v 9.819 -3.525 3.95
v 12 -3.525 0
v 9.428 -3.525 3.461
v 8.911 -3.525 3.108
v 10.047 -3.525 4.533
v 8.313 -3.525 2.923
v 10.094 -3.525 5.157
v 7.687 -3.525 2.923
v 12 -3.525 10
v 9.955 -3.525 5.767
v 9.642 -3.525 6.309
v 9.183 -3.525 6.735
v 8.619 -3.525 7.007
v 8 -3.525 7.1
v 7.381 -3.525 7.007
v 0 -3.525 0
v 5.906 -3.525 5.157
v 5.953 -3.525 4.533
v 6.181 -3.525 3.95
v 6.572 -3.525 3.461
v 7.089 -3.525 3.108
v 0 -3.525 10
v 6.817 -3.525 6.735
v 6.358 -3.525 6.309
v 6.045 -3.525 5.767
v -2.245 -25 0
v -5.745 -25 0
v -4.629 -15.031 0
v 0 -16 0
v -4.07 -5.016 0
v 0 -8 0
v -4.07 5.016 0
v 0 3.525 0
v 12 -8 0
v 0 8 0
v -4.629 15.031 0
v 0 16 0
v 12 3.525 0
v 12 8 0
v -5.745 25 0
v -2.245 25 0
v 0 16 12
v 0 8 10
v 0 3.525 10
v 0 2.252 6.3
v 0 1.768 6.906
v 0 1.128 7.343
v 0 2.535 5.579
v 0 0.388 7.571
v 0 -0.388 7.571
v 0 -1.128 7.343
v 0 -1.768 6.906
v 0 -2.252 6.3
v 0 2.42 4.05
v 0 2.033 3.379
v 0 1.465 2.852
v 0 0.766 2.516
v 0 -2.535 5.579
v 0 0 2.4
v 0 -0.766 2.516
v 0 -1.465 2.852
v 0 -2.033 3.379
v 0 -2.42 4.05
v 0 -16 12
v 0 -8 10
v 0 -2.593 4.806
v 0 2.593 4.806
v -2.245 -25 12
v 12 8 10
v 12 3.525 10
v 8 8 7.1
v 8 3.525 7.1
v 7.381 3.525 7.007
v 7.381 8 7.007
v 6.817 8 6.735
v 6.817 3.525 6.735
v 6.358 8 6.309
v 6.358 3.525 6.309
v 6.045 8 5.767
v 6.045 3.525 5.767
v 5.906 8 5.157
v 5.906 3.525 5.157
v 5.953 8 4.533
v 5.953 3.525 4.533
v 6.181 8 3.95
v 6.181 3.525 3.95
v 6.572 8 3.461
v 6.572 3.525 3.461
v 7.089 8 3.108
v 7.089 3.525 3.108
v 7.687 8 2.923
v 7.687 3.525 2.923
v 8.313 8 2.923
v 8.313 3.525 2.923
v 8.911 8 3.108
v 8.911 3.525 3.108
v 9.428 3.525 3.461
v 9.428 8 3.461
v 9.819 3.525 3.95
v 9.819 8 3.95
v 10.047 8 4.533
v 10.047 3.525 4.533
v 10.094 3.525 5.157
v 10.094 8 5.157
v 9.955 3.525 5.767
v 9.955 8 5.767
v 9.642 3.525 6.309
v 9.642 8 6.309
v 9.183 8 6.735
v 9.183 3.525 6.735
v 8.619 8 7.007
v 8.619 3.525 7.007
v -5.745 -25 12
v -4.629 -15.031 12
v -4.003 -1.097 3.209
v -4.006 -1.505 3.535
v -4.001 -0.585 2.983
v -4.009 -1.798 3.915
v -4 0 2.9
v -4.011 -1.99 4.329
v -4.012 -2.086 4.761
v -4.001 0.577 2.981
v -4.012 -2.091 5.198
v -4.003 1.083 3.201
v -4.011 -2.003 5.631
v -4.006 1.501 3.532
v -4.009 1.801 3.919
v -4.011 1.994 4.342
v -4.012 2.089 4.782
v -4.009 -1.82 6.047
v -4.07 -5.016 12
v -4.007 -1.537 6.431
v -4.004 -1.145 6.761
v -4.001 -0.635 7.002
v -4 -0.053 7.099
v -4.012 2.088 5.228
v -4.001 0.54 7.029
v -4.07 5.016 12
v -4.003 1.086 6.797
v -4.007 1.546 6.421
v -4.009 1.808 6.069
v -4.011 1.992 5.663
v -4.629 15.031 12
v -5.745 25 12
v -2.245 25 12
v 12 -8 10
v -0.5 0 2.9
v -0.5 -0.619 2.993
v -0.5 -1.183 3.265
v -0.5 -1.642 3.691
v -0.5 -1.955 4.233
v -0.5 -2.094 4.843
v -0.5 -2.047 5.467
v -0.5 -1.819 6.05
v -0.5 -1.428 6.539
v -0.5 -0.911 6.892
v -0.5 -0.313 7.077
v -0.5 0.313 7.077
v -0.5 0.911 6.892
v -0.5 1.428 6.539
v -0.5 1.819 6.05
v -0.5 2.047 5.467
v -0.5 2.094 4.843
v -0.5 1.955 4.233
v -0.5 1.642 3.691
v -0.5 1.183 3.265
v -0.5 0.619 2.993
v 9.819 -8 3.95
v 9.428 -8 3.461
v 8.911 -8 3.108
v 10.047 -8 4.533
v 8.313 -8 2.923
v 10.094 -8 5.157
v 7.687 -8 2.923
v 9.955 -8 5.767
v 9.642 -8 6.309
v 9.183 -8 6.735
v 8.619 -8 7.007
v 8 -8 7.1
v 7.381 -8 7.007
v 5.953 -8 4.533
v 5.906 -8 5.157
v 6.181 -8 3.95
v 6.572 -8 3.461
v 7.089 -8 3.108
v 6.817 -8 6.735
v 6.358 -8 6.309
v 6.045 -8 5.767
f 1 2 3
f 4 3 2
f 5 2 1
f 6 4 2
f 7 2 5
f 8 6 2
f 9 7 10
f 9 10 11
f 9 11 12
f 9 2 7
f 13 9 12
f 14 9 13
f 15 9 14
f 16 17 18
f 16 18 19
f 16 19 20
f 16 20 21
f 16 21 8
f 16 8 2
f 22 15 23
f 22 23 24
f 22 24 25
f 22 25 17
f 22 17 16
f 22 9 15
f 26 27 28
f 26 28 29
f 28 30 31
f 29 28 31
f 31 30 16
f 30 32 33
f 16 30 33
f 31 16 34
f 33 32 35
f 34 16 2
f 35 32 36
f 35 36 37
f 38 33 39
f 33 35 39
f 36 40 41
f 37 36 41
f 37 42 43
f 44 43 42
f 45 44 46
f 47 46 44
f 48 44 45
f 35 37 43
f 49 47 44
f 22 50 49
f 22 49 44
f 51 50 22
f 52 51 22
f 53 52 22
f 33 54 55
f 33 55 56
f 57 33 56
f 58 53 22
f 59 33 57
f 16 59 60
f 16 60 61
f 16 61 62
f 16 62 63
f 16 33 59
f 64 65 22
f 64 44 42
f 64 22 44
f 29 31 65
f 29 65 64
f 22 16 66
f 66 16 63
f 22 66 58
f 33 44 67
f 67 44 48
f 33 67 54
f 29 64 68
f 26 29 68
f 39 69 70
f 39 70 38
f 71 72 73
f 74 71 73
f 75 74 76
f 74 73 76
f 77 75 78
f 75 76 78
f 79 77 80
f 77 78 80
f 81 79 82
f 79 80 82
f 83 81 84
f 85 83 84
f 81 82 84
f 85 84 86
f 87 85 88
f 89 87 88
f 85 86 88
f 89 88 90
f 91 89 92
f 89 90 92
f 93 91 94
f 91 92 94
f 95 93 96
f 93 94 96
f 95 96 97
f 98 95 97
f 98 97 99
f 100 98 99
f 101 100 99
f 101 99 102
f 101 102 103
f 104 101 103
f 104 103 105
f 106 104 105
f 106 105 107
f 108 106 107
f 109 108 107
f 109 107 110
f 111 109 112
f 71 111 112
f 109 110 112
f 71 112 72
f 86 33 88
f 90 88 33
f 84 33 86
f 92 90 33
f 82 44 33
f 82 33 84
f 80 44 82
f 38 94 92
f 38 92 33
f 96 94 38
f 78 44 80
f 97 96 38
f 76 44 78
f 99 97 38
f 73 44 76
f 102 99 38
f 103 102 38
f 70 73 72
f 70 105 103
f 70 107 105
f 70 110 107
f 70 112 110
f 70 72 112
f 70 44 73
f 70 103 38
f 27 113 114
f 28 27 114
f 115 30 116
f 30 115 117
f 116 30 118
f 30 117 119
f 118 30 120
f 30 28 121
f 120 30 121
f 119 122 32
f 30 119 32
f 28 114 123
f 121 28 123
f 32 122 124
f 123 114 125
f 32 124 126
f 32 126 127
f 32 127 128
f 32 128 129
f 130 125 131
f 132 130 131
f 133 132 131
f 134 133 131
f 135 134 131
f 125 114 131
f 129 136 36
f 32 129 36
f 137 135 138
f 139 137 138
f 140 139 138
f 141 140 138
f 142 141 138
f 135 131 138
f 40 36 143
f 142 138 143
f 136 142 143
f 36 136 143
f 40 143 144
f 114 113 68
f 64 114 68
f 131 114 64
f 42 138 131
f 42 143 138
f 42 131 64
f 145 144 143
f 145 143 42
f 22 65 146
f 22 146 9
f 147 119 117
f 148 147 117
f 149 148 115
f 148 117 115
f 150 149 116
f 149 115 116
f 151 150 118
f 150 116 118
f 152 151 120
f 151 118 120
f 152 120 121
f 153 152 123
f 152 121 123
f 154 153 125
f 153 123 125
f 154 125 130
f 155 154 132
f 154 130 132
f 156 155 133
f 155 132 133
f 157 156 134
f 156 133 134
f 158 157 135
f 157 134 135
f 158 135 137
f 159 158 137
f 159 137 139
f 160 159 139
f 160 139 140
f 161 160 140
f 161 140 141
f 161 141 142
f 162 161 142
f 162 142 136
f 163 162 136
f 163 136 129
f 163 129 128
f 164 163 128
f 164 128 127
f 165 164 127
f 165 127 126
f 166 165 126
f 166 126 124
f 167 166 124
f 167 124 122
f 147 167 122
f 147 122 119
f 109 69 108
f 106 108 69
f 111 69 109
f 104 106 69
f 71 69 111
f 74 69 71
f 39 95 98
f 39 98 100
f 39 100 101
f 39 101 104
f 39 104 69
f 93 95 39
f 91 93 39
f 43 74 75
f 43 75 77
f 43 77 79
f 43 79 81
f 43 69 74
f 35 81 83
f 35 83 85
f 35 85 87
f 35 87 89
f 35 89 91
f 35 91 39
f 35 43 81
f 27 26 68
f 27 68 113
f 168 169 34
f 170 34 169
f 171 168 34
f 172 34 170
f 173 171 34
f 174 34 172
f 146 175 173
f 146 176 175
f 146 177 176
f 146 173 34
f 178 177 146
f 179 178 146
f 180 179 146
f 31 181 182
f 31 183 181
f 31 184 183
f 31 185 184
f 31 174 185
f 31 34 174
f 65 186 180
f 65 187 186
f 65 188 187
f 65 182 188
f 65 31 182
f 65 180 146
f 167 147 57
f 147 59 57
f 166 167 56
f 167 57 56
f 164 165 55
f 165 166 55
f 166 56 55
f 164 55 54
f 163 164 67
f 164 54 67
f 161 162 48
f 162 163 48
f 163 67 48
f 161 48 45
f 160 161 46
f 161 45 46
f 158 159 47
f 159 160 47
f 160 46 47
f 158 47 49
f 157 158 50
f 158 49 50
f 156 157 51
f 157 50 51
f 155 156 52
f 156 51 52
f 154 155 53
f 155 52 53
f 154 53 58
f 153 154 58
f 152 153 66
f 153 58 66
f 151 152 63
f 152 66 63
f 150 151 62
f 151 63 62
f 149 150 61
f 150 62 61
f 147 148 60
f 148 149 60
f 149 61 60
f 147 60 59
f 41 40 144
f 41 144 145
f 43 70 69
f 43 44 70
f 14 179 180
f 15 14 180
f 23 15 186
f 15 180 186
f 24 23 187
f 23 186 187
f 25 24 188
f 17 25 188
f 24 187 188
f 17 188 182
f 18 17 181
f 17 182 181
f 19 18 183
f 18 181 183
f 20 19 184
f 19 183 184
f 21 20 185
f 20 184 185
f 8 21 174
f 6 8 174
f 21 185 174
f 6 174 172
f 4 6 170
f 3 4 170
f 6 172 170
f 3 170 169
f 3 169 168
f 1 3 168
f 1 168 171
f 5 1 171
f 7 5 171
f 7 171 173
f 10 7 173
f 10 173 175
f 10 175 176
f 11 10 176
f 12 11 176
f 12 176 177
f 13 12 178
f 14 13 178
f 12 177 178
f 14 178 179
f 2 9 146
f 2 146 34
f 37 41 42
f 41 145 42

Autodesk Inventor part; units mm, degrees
ref_plane "YZ Plane" through (0, 0, 0) normal (1, 0, 0) x (0, 1, 0)
ref_plane "XZ Plane" through (0, 0, 0) normal (0, 1, 0) x (-1, 0, 0)
ref_plane "XY Plane" through (0, 0, 0) normal (0, 0, 1) x (1, 0, 0)
sketch "Skizze1" plane through (0, 0, 0) normal (0, 0, 1) x (1, 0, 0)
  line L0 (-7, 25) -> (0, 25)
  line L1 (0, 25) -> (0, -25)
  line L2 (0, -25) -> (-7, -25)
  line L3 (-7, -25) -> (-7, 25)
  point P0 (0, 0)
  point P1 (0, 0)
  dimension "d0" = 7
  dimension "d1" = 50
extrude "Extrusion1" add sketch "Skizze1" along normal blind 12
sketch "Skizze2" plane through (0, -25, 0) normal (1, 0, 0) x (0, 0, -1)
  line L0 (-10, 33) -> (0, 33)
  line L1 (0, 33) -> (0, 17)
  line L2 (0, 17) -> (-10, 17)
  line L3 (-10, 17) -> (-10, 33)
  line L4 (0, 0) -> (0, 50) projected
  line L5 (-12, 0) -> (-12, 50) projected
  point P0 (0, 25)
  point P1 (0, 25)
  point P2 (0, 25)
  dimension "d4" = 0
  dimension "d6" = 16
  dimension "d48" = 10
extrude "Extrusion2" add sketch "Skizze2" along normal blind 12
sketch "Skizze5" plane through (0, 0, 12) normal (0, 0, 1) x (1, 0, 0)
  line L0 (12, -3.525) -> (0, -3.525)
  line L1 (0, -3.525) -> (0, 3.525)
  line L2 (0, 3.525) -> (12, 3.525)
  line L3 (12, 3.525) -> (12, -3.525)
  line L4 (12, -3.525) -> (0, 3.525) construction
  line L5 (0, -3.525) -> (12, 3.525) construction
  line L6 (12, 8) -> (12, -8) projected
  point P0 (0, 0)
  point P1 (6, 0)
  point P2 (6, 0)
  point P3 (0, 0)
  point P4 (6, 0)
  dimension "d27" = 7.05
extrude "Extrusion3" cut sketch "Skizze5" against normal through all
sketch "Skizze6" plane through (0, 8, 12) normal (0, 1, 0) x (1, 0, 0)
  line L0 (0, 2) -> (0, 12) construction
  line L1 (0, 2) -> (12, 2) construction
  line L2 (12, 12) -> (12, 2) construction
  line L3 (0, 12) -> (12, 12) construction
  point P0 (0, 12)
  point P1 (8, 7)
  point P2 (12, 7)
  point P3 (6, 2)
  dimension "d38" = 8
  dimension "d47" = 5
hole "Bohrung3" at (8, 8, 5) direction (0, -1, 0) diameter 4.2 end through all
sketch "Skizze7" plane through (0, -3.525, 12) normal (1, 0, 0) x (0, 0, -1)
  line L0 (12, 7.05) -> (12, 0) construction
  line L1 (2, 7.05) -> (12, 7.05) construction
  line L2 (0, -21.475) -> (0, 28.525) construction
  line L3 (2, 0) -> (12, 0) construction
  line L4 (12, 0) -> (2, 0) projected
  line L5 (12, -21.475) -> (0, -21.475) projected
  line L6 (12, -21.475) -> (12, -4.475) projected
  line L7 (12, -4.475) -> (2, -4.475) projected
  line L8 (2, -4.475) -> (2, 0) projected
  line L9 (2, 7.05) -> (2, 11.525) projected
  line L10 (2, 11.525) -> (12, 11.525) projected
  line L11 (12, 11.525) -> (12, 28.525) projected
  line L12 (12, 28.525) -> (0, 28.525) projected
  line L13 (2, 7.05) -> (12, 7.05) projected
  point P0 (12, 3.525)
  point P1 (0, 0)
  point P2 (7, 3.525)
  point P3 (7, 0)
  point P4 (0, 3.525)
  point P5 (7, 7.05)
hole "Bohrung4" at (0, 0, 5) direction (-1, 0, 0) diameter 4.2 end through all
sketch "Skizze9" plane through (0, 0, 12) normal (0, 0, 1) x (1, 0, 0)
  line L0 (-7, -25) -> (0, -25) projected
  line L1 (0, -25) -> (0, 25) projected
  line L2 (0, 25) -> (-7, 25) projected
  line L3 (-7, 25) -> (-7, -25) projected
  arc A0 (-5.7446, -25) -> (-5.7446, 25) centre (-184, 0) ccw
  line L4 (0, -8) -> (12, -8) projected
  line L5 (-4, 0) -> (0, 0) construction
  line L6 (-2.2446, 25) -> (0, 16)
  line L7 (0, 8) -> (12, 8) projected
  line L8 (0, -16) -> (-2.2446, -25)
  point P0 (0, 0)
  dimension "d55" = 4
  dimension "d56" = 180
  dimension "d57" = 8
  dimension "d58" = 3.5
  dimension "d59" = 8
  dimension "d60" = 3.5
extrude "Extrusion4" cut sketch "Skizze9" against normal through all contours L3 L2 A0 L0 | L8 L1 L0 | L2 L1 L6
chamfer "Fase1" distance 0.5 angle 45 1 edges at (0, 0, 7.1)
properties part number "Schaufel_newtest" material "Aluminium 6061"
